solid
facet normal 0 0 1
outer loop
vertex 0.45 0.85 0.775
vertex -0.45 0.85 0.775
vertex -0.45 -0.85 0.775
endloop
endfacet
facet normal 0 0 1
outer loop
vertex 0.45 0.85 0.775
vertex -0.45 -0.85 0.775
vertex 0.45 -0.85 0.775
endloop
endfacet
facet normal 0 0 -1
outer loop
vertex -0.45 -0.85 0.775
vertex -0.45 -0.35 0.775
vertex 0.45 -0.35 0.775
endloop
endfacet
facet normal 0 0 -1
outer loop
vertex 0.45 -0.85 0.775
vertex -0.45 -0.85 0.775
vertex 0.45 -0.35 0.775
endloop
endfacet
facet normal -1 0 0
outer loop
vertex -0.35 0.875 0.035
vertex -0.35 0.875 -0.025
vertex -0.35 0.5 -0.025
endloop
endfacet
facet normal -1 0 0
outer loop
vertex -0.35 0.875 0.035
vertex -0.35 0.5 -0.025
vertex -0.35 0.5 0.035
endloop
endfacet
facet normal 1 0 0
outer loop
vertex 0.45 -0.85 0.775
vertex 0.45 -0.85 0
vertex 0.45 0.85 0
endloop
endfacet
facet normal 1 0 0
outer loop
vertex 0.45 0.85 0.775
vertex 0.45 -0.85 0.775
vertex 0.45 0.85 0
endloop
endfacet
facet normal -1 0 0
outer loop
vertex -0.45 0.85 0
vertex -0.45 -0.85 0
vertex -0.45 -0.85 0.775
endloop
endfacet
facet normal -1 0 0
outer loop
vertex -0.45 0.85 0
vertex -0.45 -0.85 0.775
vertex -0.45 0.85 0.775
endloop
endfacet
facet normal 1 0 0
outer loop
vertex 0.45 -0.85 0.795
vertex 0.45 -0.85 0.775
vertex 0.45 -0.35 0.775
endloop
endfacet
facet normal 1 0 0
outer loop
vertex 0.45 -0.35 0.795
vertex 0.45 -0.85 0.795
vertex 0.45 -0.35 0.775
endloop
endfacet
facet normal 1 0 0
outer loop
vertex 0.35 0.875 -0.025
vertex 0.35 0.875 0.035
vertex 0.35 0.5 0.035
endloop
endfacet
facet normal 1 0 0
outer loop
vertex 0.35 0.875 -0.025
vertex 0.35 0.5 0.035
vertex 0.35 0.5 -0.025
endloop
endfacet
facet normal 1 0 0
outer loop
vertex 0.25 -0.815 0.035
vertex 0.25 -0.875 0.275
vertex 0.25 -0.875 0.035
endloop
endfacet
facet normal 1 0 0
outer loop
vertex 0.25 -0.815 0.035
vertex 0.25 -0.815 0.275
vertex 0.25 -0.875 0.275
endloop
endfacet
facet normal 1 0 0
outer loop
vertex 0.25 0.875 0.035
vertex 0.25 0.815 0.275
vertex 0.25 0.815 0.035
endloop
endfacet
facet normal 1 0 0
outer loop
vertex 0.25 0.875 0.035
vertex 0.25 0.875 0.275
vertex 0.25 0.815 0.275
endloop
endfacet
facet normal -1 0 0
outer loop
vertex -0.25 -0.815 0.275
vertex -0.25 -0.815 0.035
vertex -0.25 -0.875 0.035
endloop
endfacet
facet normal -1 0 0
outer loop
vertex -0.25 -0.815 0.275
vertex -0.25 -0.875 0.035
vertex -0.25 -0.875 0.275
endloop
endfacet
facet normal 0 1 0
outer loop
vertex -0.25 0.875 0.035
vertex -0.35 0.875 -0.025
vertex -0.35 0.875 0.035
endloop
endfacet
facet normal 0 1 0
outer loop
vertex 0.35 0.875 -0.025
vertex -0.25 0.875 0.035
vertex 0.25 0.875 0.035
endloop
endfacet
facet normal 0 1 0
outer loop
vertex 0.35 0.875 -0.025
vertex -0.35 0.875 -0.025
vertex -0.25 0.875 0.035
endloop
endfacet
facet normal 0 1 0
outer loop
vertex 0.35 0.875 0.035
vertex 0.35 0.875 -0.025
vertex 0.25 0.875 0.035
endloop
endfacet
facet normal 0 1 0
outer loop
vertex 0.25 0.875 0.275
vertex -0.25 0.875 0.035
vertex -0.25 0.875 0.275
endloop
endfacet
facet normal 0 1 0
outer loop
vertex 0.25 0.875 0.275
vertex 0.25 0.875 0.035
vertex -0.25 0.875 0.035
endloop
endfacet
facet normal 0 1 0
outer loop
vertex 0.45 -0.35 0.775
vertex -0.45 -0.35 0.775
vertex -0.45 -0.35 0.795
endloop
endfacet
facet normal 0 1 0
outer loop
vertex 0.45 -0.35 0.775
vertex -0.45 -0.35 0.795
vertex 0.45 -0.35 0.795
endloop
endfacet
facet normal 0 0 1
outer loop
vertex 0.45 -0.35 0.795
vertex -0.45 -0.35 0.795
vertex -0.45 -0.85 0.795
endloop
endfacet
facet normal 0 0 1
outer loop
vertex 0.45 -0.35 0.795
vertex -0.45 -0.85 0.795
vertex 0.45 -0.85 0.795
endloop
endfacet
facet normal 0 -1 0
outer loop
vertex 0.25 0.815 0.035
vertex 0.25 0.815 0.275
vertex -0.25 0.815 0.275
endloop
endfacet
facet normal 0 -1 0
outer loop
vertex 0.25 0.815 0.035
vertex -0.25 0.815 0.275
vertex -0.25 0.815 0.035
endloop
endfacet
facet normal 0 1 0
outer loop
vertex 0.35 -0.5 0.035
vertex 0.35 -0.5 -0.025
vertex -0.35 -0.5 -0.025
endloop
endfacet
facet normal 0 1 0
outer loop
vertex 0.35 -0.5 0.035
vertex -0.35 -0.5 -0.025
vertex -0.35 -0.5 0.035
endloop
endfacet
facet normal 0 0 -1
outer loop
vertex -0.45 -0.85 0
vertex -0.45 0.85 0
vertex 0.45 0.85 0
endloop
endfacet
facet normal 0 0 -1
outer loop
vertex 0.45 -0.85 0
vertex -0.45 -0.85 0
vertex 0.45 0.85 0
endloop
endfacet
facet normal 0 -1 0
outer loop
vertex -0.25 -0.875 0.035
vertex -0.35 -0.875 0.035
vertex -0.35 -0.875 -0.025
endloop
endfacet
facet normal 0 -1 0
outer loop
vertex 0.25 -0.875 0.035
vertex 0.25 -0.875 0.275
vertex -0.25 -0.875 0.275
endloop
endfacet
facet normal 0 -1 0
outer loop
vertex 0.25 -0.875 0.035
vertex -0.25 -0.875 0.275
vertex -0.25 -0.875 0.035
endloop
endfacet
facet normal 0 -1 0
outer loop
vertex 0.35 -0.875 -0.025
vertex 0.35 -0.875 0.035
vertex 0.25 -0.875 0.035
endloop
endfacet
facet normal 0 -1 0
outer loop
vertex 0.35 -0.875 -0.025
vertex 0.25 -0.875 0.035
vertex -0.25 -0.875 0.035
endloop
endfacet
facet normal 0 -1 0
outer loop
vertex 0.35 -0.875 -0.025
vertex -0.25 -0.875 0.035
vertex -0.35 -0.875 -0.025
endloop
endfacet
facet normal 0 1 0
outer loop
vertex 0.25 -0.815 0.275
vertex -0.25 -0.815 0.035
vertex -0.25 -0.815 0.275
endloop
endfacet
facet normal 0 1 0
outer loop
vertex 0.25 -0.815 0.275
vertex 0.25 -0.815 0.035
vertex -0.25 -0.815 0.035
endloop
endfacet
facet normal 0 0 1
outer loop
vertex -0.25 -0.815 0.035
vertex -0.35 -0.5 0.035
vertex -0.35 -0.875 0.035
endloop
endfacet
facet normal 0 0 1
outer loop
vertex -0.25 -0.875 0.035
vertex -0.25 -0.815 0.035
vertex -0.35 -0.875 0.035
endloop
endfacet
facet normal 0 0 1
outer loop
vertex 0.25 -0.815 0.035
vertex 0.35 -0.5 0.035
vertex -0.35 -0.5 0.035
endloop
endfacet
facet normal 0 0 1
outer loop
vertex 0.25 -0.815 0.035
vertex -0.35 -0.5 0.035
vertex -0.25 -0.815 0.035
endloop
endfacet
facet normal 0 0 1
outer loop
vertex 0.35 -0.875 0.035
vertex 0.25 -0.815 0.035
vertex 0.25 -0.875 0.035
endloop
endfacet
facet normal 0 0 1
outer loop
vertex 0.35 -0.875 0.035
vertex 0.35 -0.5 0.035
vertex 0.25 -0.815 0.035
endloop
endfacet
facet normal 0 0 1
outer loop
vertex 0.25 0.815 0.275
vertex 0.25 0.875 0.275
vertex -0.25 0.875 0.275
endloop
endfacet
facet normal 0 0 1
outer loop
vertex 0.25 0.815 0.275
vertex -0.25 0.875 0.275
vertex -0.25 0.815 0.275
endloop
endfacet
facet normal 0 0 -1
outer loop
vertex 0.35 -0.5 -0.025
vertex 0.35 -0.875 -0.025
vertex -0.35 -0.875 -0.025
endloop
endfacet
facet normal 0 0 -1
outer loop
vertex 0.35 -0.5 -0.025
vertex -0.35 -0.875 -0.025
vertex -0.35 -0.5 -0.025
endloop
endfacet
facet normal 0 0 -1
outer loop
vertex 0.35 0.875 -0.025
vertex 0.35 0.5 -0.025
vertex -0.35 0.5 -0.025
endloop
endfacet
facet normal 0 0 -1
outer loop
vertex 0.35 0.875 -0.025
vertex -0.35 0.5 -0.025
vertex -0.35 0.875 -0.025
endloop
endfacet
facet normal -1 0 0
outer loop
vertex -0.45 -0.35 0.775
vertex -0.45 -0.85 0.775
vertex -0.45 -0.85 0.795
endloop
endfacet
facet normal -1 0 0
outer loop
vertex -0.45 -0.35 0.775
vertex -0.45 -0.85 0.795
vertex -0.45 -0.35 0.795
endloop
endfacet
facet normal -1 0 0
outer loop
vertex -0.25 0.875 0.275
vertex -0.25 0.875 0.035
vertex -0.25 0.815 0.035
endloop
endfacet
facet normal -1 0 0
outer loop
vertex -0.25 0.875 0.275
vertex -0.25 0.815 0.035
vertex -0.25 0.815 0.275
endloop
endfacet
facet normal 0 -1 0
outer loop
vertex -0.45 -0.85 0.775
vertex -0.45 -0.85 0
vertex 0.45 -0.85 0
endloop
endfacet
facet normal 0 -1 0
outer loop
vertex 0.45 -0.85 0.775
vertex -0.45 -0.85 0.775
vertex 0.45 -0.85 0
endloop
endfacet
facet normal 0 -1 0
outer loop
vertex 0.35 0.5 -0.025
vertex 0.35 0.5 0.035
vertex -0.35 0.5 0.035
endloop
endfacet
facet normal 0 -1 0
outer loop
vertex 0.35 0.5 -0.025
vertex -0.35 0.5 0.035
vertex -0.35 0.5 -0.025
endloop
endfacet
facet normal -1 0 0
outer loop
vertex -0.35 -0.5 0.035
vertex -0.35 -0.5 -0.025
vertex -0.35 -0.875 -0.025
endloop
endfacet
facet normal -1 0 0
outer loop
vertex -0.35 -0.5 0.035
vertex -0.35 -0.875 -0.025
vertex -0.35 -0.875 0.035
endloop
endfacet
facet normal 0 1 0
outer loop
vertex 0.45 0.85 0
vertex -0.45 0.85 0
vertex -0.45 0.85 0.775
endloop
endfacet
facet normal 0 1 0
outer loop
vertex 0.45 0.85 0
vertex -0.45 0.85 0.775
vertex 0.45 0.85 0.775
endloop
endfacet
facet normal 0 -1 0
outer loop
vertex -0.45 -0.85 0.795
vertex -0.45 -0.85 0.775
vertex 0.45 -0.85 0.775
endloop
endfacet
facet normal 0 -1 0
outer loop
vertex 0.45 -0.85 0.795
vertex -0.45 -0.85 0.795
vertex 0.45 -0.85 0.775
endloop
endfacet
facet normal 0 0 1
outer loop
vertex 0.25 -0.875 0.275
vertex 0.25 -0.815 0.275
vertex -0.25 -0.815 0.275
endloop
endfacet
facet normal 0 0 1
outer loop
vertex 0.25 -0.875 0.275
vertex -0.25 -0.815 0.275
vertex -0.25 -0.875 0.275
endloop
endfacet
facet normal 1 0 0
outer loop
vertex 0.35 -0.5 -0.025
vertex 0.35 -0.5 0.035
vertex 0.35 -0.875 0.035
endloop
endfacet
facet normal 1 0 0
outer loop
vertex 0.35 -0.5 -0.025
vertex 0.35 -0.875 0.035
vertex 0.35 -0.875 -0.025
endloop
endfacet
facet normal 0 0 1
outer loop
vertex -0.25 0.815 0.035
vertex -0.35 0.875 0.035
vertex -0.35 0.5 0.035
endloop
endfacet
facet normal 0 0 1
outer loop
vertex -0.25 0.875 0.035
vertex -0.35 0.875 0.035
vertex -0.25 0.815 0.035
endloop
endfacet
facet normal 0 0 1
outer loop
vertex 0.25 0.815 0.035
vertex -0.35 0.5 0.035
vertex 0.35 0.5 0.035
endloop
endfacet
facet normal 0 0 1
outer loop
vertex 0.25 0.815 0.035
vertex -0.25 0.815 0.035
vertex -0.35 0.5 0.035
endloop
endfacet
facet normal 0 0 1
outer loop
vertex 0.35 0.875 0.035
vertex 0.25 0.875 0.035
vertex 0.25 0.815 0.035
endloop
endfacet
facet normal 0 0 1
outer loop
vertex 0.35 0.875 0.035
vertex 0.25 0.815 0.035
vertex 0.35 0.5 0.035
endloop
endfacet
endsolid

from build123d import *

# Parameters (mm, degrees)
F0_W          = 0.9
F0_H          = 1.7
F1_DEPTH      = 0.775
F2_W          = 0.9
F2_H          = 0.5
F3_DEPTH      = 0.02
F5_DEPTH      = 0.46
F7_DEPTH      = 0.876
F7_DEPTH_BACK = 0.876


with BuildPart() as f1:
    # F0 (on Top) → F1 (new body)
    with BuildSketch(Plane.XY):
        Rectangle(F0_W, F0_H)
    extrude(amount=F1_DEPTH)


with BuildPart() as f3:
    # F2 (on face) → F3 (new body)
    with BuildSketch(Plane.XY.offset(0.775)):
        with Locations((0, -0.6)):
            Rectangle(F2_W, F2_H)
    extrude(amount=F3_DEPTH)


with BuildPart() as f5:
    # F4 (on Right) → F5 (new body, symmetric)
    with BuildSketch(Plane.YZ):
        Polygon((-0.815, 0.035), (-0.815, 0.275), (-0.875, 0.275), (-0.875, -0.025), (-0.5, -0.025), (-0.5, 0.035), align=None)
    extrude(amount=F5_DEPTH, both=True)


with BuildPart() as f5b:
    # F4 (on Right) → F5, piece 2 (new body, symmetric)
    with BuildSketch(Plane.YZ):
        Polygon((0.875, 0.275), (0.815, 0.275), (0.815, 0.035), (0.5, 0.035), (0.5, -0.025), (0.875, -0.025), align=None)
    extrude(amount=F5_DEPTH, both=True)


with BuildPart() as f7_tool:
    # F6 (on Front) → F7 (new body, two sides)
    with BuildSketch(Plane.XZ) as f7_sk:
        Polygon((-0.25, 0.795), (-0.5751563585, 0.795), (-0.5751563585, -0.025), (-0.35, -0.025), (-0.35, 0.035), (-0.25, 0.035), align=None)
        Polygon((0.5751563585, -0.025), (0.5751563585, 0.795), (0.25, 0.795), (0.25, 0.035), (0.35, 0.035), (0.35, -0.025), align=None)
    extrude(amount=-F7_DEPTH)
    extrude(f7_sk.sketch, amount=F7_DEPTH_BACK)


with BuildPart() as f5_1:
    add(f5.part)

    # F7: cut by f7_tool
    add(f7_tool.part, mode=Mode.SUBTRACT)


with BuildPart() as f5b_1:
    add(f5b.part)

    # F7: cut by f7_tool
    add(f7_tool.part, mode=Mode.SUBTRACT)


solid = Compound([f1.part, f3.part, f5_1.part, f5b_1.part])
